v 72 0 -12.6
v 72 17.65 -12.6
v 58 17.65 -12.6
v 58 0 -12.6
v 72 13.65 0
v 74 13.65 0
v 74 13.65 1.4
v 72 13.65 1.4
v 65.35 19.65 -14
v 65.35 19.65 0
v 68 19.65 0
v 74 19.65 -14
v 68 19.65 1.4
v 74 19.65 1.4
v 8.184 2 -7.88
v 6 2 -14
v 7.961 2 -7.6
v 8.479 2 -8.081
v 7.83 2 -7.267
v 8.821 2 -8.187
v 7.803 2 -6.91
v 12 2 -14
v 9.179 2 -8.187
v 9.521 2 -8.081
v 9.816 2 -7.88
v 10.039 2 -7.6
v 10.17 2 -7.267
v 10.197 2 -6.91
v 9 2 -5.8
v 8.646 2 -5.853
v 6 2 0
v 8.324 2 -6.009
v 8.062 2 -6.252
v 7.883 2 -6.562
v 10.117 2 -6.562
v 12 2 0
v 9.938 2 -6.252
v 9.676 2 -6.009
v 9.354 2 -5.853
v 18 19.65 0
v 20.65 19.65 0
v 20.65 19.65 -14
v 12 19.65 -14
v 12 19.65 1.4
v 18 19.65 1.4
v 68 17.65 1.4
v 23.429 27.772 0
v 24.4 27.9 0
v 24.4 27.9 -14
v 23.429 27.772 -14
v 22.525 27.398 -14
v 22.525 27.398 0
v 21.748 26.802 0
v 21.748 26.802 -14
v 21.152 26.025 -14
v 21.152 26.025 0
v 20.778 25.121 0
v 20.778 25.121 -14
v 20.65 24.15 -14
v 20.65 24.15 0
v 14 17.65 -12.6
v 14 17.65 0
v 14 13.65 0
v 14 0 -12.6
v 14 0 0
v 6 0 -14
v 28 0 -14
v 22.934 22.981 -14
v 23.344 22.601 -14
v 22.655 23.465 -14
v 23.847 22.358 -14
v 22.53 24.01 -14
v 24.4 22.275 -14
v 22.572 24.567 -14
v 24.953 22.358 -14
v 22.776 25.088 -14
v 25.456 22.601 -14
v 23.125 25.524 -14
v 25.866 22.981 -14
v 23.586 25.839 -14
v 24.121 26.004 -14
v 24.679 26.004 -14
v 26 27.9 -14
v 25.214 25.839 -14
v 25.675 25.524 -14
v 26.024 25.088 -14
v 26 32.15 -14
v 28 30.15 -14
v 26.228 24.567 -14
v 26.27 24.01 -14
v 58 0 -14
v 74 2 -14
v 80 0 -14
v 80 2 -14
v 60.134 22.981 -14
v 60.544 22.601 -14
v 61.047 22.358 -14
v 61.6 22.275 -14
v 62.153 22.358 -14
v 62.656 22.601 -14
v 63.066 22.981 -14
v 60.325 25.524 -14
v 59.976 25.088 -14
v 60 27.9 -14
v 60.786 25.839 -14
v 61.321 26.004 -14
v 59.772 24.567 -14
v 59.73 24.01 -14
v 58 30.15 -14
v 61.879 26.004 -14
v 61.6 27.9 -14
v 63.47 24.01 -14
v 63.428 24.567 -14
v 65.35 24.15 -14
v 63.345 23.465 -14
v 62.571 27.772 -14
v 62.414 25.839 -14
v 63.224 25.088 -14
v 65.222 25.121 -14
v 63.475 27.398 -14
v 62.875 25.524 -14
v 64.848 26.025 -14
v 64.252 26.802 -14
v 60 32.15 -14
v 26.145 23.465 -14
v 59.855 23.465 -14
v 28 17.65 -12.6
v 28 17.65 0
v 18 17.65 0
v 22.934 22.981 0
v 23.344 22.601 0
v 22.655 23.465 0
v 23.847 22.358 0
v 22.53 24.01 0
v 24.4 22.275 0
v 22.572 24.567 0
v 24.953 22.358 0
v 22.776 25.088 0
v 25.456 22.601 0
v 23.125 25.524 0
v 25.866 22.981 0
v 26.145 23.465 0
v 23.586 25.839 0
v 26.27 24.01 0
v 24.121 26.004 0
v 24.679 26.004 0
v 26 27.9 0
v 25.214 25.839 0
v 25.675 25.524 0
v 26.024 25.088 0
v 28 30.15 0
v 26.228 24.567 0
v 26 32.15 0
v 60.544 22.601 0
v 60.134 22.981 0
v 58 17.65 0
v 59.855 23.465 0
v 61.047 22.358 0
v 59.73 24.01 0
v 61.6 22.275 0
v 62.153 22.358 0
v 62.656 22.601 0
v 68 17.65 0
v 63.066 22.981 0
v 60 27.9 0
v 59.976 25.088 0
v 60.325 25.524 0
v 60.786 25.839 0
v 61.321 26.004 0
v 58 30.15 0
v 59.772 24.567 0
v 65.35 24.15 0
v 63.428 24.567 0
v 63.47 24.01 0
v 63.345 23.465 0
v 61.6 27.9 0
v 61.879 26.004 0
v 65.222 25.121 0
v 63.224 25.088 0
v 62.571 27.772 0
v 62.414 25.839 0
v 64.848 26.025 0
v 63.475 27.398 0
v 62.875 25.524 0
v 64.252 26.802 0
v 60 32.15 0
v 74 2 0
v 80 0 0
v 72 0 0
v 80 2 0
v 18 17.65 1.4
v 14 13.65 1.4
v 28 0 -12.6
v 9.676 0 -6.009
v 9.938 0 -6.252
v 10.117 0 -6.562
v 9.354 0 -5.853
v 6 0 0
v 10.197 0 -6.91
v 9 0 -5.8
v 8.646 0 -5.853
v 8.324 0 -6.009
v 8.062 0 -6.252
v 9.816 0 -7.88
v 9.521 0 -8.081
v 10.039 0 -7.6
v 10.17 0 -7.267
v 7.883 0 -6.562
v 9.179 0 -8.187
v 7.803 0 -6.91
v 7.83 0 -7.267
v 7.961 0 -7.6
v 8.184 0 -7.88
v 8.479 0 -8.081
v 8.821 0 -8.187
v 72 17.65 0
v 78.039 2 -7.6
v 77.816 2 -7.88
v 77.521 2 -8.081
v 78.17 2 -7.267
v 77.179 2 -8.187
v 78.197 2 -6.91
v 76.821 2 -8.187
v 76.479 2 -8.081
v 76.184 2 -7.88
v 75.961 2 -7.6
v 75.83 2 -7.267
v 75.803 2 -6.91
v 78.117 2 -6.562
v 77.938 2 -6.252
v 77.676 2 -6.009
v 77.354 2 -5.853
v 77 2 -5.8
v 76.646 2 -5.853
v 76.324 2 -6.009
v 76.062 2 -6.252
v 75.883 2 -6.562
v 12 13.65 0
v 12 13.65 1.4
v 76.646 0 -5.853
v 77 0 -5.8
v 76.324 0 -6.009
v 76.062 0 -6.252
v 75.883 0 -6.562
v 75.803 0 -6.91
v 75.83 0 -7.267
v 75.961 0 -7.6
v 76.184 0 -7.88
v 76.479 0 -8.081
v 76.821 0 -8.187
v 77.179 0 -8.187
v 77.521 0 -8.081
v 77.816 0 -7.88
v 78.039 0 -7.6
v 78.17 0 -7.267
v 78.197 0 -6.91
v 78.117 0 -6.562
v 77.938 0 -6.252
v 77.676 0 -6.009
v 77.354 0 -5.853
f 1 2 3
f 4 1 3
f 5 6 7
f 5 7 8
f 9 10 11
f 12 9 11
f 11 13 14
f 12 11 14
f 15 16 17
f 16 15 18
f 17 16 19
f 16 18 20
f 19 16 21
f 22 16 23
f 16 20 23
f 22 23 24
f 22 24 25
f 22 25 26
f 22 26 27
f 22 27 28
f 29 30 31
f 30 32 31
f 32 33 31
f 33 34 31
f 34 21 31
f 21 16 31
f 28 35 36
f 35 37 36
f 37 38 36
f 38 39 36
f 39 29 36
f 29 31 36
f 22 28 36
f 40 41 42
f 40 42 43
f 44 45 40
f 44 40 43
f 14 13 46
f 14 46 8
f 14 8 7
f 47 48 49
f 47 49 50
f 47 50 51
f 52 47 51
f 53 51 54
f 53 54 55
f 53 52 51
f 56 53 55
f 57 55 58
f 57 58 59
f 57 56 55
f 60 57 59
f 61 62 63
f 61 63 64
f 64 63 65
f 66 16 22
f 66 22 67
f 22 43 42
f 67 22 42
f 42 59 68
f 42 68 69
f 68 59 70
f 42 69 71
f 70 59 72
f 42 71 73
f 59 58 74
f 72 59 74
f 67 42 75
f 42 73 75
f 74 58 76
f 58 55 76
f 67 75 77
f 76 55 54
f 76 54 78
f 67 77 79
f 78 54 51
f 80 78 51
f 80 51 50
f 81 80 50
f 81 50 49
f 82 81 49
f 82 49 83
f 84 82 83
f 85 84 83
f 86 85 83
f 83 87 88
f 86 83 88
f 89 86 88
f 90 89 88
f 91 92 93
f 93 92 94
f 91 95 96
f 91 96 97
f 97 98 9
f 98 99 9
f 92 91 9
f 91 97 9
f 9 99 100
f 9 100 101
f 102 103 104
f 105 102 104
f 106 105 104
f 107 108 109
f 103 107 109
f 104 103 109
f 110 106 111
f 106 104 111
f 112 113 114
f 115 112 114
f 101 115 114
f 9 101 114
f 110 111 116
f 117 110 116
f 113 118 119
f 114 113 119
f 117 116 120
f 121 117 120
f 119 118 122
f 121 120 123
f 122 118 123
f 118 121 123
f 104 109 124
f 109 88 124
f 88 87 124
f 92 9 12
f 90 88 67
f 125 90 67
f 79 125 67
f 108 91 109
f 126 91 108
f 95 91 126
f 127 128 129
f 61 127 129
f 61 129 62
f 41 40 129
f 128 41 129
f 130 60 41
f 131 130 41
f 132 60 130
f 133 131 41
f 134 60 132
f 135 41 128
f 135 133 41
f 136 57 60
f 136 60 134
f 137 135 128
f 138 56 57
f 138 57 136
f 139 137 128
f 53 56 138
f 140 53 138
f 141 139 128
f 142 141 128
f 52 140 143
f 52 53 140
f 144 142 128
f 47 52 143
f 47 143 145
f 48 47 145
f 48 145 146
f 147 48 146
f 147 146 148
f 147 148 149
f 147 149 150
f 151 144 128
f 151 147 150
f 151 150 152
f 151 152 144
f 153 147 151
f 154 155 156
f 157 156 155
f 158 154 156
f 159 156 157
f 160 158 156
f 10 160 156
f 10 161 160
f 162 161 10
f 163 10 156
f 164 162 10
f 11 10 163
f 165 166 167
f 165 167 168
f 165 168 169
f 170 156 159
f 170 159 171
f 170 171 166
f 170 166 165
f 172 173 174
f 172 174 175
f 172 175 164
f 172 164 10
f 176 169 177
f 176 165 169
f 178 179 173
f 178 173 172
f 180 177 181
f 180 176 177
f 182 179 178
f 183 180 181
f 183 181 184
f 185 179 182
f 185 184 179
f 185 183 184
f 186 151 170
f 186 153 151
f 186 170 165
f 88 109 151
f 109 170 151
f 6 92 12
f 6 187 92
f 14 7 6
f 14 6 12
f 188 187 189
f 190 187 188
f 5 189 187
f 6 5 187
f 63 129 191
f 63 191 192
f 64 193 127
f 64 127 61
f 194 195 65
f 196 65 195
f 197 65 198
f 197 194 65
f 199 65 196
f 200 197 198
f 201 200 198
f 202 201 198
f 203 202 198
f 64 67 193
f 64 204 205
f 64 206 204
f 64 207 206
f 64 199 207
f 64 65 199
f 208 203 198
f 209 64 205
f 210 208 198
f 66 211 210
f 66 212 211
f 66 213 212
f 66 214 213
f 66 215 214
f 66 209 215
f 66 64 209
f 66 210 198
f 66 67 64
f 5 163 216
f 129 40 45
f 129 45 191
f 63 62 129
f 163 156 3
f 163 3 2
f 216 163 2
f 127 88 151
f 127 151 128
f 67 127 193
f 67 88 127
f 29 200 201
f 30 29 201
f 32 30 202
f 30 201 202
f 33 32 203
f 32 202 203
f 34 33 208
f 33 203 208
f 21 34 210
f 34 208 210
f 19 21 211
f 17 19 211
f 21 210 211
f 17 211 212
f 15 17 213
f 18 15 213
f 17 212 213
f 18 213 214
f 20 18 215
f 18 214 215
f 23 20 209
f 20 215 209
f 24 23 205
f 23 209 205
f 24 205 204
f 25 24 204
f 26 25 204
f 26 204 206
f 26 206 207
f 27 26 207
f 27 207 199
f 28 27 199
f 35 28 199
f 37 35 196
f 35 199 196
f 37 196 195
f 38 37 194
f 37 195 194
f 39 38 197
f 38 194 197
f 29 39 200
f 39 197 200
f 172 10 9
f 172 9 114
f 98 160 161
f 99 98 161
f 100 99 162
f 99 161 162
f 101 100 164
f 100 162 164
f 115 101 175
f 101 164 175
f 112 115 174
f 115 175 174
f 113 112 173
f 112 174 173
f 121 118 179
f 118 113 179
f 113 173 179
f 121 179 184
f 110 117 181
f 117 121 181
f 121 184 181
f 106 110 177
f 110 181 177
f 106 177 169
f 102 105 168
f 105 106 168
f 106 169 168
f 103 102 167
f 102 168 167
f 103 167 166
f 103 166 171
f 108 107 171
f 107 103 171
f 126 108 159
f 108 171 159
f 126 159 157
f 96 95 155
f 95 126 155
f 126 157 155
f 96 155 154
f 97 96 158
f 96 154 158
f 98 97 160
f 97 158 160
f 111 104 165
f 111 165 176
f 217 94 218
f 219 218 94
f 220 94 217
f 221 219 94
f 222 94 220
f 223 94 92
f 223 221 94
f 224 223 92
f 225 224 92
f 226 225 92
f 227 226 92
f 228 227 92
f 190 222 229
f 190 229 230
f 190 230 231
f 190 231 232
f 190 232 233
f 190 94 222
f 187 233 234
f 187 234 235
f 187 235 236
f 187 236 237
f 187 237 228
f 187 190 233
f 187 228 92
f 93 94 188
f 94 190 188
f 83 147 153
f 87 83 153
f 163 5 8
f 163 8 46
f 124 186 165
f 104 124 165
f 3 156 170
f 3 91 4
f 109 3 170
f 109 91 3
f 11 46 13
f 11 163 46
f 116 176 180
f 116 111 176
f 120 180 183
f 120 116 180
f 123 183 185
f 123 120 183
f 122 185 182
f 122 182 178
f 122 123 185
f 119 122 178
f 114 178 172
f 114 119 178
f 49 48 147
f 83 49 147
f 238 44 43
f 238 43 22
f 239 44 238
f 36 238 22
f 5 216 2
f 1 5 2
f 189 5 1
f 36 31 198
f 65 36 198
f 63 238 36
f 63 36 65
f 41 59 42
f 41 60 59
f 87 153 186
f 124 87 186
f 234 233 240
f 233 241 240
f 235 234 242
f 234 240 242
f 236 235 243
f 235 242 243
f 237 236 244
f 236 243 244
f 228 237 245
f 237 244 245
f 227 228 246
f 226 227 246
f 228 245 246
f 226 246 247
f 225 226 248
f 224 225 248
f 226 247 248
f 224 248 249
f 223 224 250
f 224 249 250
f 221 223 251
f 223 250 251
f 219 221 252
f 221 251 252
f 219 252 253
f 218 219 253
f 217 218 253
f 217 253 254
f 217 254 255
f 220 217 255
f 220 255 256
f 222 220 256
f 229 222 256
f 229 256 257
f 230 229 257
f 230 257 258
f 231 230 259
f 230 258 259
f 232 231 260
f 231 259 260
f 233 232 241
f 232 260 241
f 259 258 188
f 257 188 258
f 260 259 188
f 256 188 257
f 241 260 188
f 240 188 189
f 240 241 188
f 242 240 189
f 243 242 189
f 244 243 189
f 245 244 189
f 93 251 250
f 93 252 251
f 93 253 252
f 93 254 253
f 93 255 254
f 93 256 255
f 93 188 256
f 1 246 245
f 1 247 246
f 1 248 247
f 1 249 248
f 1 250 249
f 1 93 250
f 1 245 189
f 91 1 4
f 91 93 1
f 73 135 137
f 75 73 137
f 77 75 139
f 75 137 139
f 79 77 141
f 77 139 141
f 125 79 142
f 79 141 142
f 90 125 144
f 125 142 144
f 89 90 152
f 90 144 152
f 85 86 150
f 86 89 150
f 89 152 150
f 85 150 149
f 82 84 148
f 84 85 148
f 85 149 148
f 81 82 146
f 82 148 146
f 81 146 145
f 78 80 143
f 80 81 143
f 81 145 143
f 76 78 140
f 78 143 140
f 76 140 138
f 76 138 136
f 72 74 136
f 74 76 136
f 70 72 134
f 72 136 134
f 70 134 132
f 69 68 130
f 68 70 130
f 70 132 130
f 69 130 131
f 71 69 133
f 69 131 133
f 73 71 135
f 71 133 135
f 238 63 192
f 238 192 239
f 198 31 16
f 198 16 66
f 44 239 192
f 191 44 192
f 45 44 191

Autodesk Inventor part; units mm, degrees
ref_plane "YZ Plane" through (0, 0, 0) normal (1, 0, 0) x (0, 1, 0)
ref_plane "XZ Plane" through (0, 0, 0) normal (0, 1, 0) x (-1, 0, 0)
ref_plane "XY Plane" through (0, 0, 0) normal (0, 0, 1) x (1, 0, 0)
sketch "スケッチ1" plane through (0, 0, 0) normal (0, 0, 1) x (1, 0, 0)
  line L0 (0, 0) -> (0, 17.65)
  line L1 (0, 17.65) -> (28, 17.65)
  line L2 (28, 17.65) -> (28, 30.15)
  line L3 (28, 30.15) -> (58, 30.15)
  line L4 (58, 30.15) -> (58, 0)
  line L5 (58, 0) -> (60, 0)
  line L6 (60, 0) -> (60, 32.15)
  line L7 (60, 32.15) -> (28, 32.15)
  line L8 (28, 32.15) -> (26, 32.15)
  line L9 (26, 32.15) -> (26, 19.65)
  line L10 (26, 19.65) -> (-2, 19.65)
  line L11 (-2, 19.65) -> (-2, 0)
  line L12 (-2, 0) -> (0, 0)
  dimension "d0" = 17.65
  dimension "d1" = 28
  dimension "d2" = 12.5
  dimension "d3" = 30
  dimension "d4" = 2
  dimension "d5" = 32.15
  dimension "d6" = 32
  dimension "d7" = 2
  dimension "d8" = 12.5
  dimension "d9" = 28
extrude "押し出し1" add sketch "スケッチ1" along normal blind 14
sketch "スケッチ2" plane through (60, 0, 0) normal (1, 0, 0) x (0, 0, -1)
  line L0 (0, 0) -> (-14, 0) projected
  line L1 (-14, 0) -> (0, 0)
  line L2 (0, 0) -> (0, 2)
  line L3 (0, 2) -> (-14, 2)
  line L4 (-14, 2) -> (-14, 0)
  dimension "d12" = 14
  dimension "d13" = 2
extrude "押し出し2" add sketch "スケッチ2" along normal blind 7
sketch "スケッチ3" plane through (-2, 0, 0) normal (-1, 0, 0) x (0, 0, 1)
  line L0 (14, 2) -> (0, 2) projected
  line L1 (0, 0) -> (14, 0)
  line L2 (14, 0) -> (14, 2)
  line L3 (14, 2) -> (0, 2)
  line L4 (0, 2) -> (0, 0)
  dimension "d16" = 14
extrude "押し出し3" add sketch "スケッチ3" along normal blind 7
sketch "スケッチ4" plane through (0, 0, 14) normal (0, 0, 1) x (1, 0, 0)
  line L0 (60, 32.15) -> (60, 24.15)
  line L1 (60, 24.15) -> (61.6, 24.15)
  arc A0 (61.6, 20.4) -> (61.6, 27.9) centre (61.6, 24.15) ccw
  line L2 (61.6, 24.15) -> (61.6, 20.4) construction
  line L3 (61.6, 24.15) -> (61.6, 27.9) construction
  line L4 (61.6, 27.9) -> (60, 27.9)
  line L5 (61.6, 20.4) -> (60, 20.4)
  line L6 (60, 2) -> (60, 32.15) projected
  line L7 (60, 27.9) -> (60, 20.4)
  point P0 (0, 0)
  dimension "d47" = 8
  dimension "d48" = 1.6
  dimension "d49" = 3.75
  dimension "d50" = 180
extrude "押し出し4" add sketch "スケッチ4" against normal blind 14
hole "穴3" at (61.6, 24.15, 14) direction (0, 0, -1) diameter 3.75 end through all
sketch "スケッチ7" plane through (0, 0, 14) normal (0, 0, 1) x (1, 0, 0)
  line L0 (60, 32.15) -> (26, 32.15) projected
  line L1 (26, 32.15) -> (26, 24.15)
  line L2 (26, 24.15) -> (24.4, 24.15)
  arc A0 (24.4, 27.9) -> (24.4, 20.4) centre (24.4, 24.15) ccw
  line L3 (24.4, 27.9) -> (26, 27.9)
  line L4 (24.4, 20.4) -> (26, 20.4)
  line L5 (26, 20.4) -> (26, 27.9)
  line L6 (26, 32.15) -> (26, 19.65) projected
  circle A1 centre (24.4, 24.15) radius 1.875
  point P0 (0, 0)
  dimension "d60" = 8
  dimension "d61" = 1.6
  dimension "d62" = 3.75
  dimension "d63" = 3.75
extrude "押し出し6" add sketch "スケッチ7" against normal blind 14 contours L1 A1 L5 L4 A0 L3 | L1 L5 A1 picked at (23.6929, 24.15)
hole "穴4" at (24.4, 24.15, 14) direction (0, 0, -1) diameter 3.75 end through all
sketch "スケッチ10" plane through (0, 17.65, 0) normal (0, -1, 0) x (1, 0, 0)
  line L0 (28, 14) -> (58, 14) projected
  line L1 (0, 0) -> (28, 0)
  line L2 (28, 0) -> (28, 14)
  line L3 (28, 14) -> (0, 14)
  line L4 (0, 14) -> (0, 0)
extrude "押し出し7" cut sketch "スケッチ10" against normal blind 0.6
sketch "スケッチ11" plane through (0, 0, 0) normal (0, -1, 0) x (1, 0, 0)
  line L0 (0, 14) -> (-9, 14) projected
  line L1 (60, 0) -> (67, 0) projected
  line L2 (-9, 14) -> (67, 14)
  line L3 (67, 14) -> (67, 0)
  line L4 (67, 0) -> (-9, 0)
  line L5 (-9, 0) -> (-9, 14)
  point P0 (0, 0)
extrude "押し出し8" cut sketch "スケッチ11" against normal blind 0.6
sketch "スケッチ12" plane through (0, 0, 14) normal (0, 0, 1) x (1, 0, 0)
  line L0 (-2, 19.65) -> (-2, 2) projected
  line L1 (-2, 19.65) -> (4, 19.65)
  line L2 (26, 19.65) -> (-2, 19.65) projected
  line L3 (4, 19.65) -> (4, 18.25)
  line L4 (0, 18.25) -> (28, 18.25) projected
  line L5 (4, 18.25) -> (0.2844, 14.5344)
  line L6 (4, 18.25) -> (9.2547, 18.25) construction
  line L7 (0.2844, 14.5344) -> (0, 14.25)
  line L8 (0, 0.6) -> (0, 18.25) projected
  line L9 (0, 14.25) -> (-2, 14.25)
  line L10 (-2, 14.25) -> (-2, 19.65)
  point P0 (0, 0)
  dimension "d79" = 6
  dimension "d80" = 135
extrude "押し出し9" add sketch "スケッチ12" along normal blind 2
sketch "スケッチ15" plane through (0, 0, 0) normal (0, 0, -1) x (-1, 0, 0)
  line L0 (0, 0.6) -> (0, 18.25) projected
  line L1 (0, 18.25) -> (-14, 18.25)
  line L2 (-14, 18.25) -> (-14, 0.6)
  line L3 (-14, 0.6) -> (0, 0.6)
  line L4 (0, 0.6) -> (0, 18.25)
  point P0 (0, 0)
  dimension "d88" = 14
extrude "押し出し11" add sketch "スケッチ15" against normal blind 1.4
sketch "スケッチ17" plane through (67, 0, 0) normal (1, 0, 0) x (0, 0, -1)
  line L0 (0, 0.6) -> (-14, 0.6) projected
  line L1 (0, 0.6) -> (-14, 0.6)
  line L2 (-14, 0.6) -> (-14, 9.5309)
  line L3 (-14, 9.5309) -> (0, 9.5309)
  line L4 (0, 9.5309) -> (0, 0.6)
  point P0 (0, 0)
extrude "押し出し13" cut sketch "スケッチ17" against normal blind 3
sketch "スケッチ18" plane through (-9, 0, 0) normal (-1, 0, 0) x (0, 0, 1)
  line L0 (0, 0.6) -> (14, 0.6) projected
  line L1 (0, 0.6) -> (14, 0.6)
  line L2 (14, 0.6) -> (14, 6.5)
  line L3 (14, 6.5) -> (0, 6.5)
  line L4 (0, 6.5) -> (0, 0.6)
  point P0 (0, 0)
extrude "押し出し14" cut sketch "スケッチ18" against normal blind 3
hole "穴5" at (-4, 2, 7) direction (0, -1, 0) diameter 2.4 end through all
hole "穴6" at (62, 2, 7) direction (0, -1, 0) diameter 2.4 end through all
mirror "ミラー1" about plane through (31.8158, 20.0509, 0) normal (0, 0, -1) of "押し出し3", "押し出し1", "押し出し4", "穴3", "押し出し2", "穴6", "穴4", "押し出し6", "押し出し7", "押し出し9", "押し出し11", "押し出し14", "押し出し13", "穴5", "押し出し8"
sketch "スケッチ19" plane through (0, 0, 14) normal (0, 0, 1) x (1, 0, 0)
  line L0 (94.8832, 81.412) -> (-62.365, 81.412)
  line L1 (-62.365, 81.412) -> (-62.365, -71.7744)
  line L2 (-62.365, -71.7744) -> (94.8832, -71.7744)
  line L3 (94.8832, -71.7744) -> (94.8832, 81.412)
  point P0 (0, 0)
extrude "押し出し15" cut sketch "スケッチ19" against normal blind 14
sketch "スケッチ20" plane through (-2, 19.65, 14) normal (0, 1, 0) x (1, 0, 0)
  line L0 (17.6833, -4.2941) -> (-12.6138, -4.2941)
  line L1 (-12.6138, -4.2941) -> (-12.6138, 1.0873)
  line L2 (-12.6138, 1.0873) -> (17.6833, 1.0873)
  line L3 (17.6833, 1.0873) -> (17.6833, -4.2941)
  point P0 (2, 14)
extrude "押し出し16" cut sketch "スケッチ20" against normal blind 14
sketch "スケッチ21" plane through (26, 27.9, -14) normal (-1, 0, 0) x (0, 0, 1)
  line L0 (0, -8.25) -> (-2, -8.25) projected
  line L1 (-2, -8.25) -> (18.9234, -8.25)
  line L2 (18.9234, -8.25) -> (18.9234, 5.2405)
  line L3 (18.9234, 5.2405) -> (-2, 5.2405)
  line L4 (-2, 5.2405) -> (-2, -8.25)
  point P0 (14, -27.9)
split body "分割1" sketch "スケッチ21" result one side removed curves L2 L3 L4 L1 removed pieces at (9.3333, 19.15, -4.6667) (58.5, 13.3, -4.6667)
sketch "スケッチ22" plane through (0, 0, 0) normal (0, 0, 1) x (1, 0, 0)
  line L0 (28, 19.65) -> (28, 30.15) projected
  line L1 (28, 19.65) -> (28, 17.65)
  line L2 (28, 17.65) -> (14, 17.65)
  line L3 (14, 17.65) -> (14, 0)
  line L4 (14, 17.65) -> (31.65, 17.65) construction
  line L5 (14, 0) -> (8, 0)
  line L6 (8, 0) -> (8, 2)
  line L7 (8, 2) -> (12, 2)
  line L8 (26.0798, 19.65) -> (12, 19.65)
  line L9 (12, 19.65) -> (12, 2)
  line L10 (58, 19.65) -> (60, 19.65) projected
  line L11 (58, 19.65) -> (58, 17.65)
  line L12 (58, 17.65) -> (72, 17.65)
  line L13 (72, 17.65) -> (72, 0)
  line L14 (72, 0) -> (78, 0)
  line L15 (78, 0) -> (78, 2)
  line L16 (78, 2) -> (74, 2)
  line L17 (74, 2) -> (74, 19.65)
  line L18 (74, 19.65) -> (60, 19.65)
  line L19 (26.0798, 19.65) -> (28, 19.65)
  line L20 (24.4, 20.4) -> (26, 20.4) projected
  line L21 (58, 19.65) -> (60, 19.65)
  point P0 (0, 0)
  dimension "d119" = 2
  dimension "d120" = 14
  dimension "d121" = 17.65
  dimension "d122" = 90
  dimension "d123" = 6
  dimension "d124" = 2
  dimension "d125" = 4
  dimension "d126" = 14
  dimension "d127" = 6
  dimension "d128" = 2
  dimension "d129" = 4
extrude "押し出し17" add sketch "スケッチ22" against normal blind 14
sketch "スケッチ23" plane through (26, 32.15, -14) normal (0, 1, 0) x (1, 0, 0)
  line L0 (32, -14) -> (2, -14) projected
  line L1 (17, -14) -> (17, 0)
  line L2 (2, 0) -> (32, 0) projected
  point P0 (-26, -14)
sketch "スケッチ25" plane through (24.4, 24.15, -14) normal (0, 0, -1) x (-1, 0, 0)
  line L0 (-3.6, -6.5) -> (10.4, -6.5) projected
  line L1 (10.4, -6.5) -> (-3.6, -6.5)
  line L2 (-3.6, -6.5) -> (-3.6, -24.15)
  line L3 (-3.6, -24.15) -> (10.4, -24.15)
  line L4 (10.4, -24.15) -> (10.4, -6.5)
  point P0 (24.4, -24.15)
extrude "押し出し18" add sketch "スケッチ25" against normal blind 1.4
ref_plane "作業平面1" through (43, 32.15, 0) normal (1, 0, 0) x (0, 0, -1)
mirror "ミラー3" about plane through (43, 32.15, 0) normal (1, 0, 0) of "押し出し18"
sketch "スケッチ26" plane through (0, 0, 0) normal (0, 0, 1) x (1, 0, 0)
  line L0 (12, 2) -> (12, 19.65) projected
  line L1 (12, 19.65) -> (18, 19.65)
  line L2 (12, 19.65) -> (26, 19.65) projected
  line L3 (18, 19.65) -> (18, 17.65)
  line L4 (28, 17.65) -> (14, 17.65) projected
  line L5 (18, 17.65) -> (14, 13.65)
  line L6 (14, 17.65) -> (14, 0) projected
  line L7 (18, 17.65) -> (23.6569, 17.65) construction
  line L8 (14, 13.65) -> (12, 13.65)
  line L9 (12, 13.65) -> (12, 19.65)
  point P0 (0, 0)
  dimension "d139" = 6
  dimension "d140" = 135
extrude "押し出し20" add sketch "スケッチ26" along normal blind 1.4
mirror "ミラー4" about plane through (43, 32.15, 0) normal (1, 0, 0) of "押し出し20"
sketch "スケッチ27" plane through (0, 0, 0) normal (0, 0, 1) x (1, 0, 0)
  line L0 (8, 2) -> (12, 2) projected
  line L1 (8, 2) -> (6, 2)
  line L2 (6, 2) -> (6, 0)
  line L3 (6, 0) -> (8, 0)
  line L4 (8, 0) -> (8, 2)
  line L5 (78, 2) -> (80, 2)
  line L6 (80, 2) -> (80, 0)
  line L7 (80, 0) -> (78, 0)
  line L8 (78, 0) -> (78, 2)
  point P0 (0, 0)
  dimension "d143" = 2
  dimension "d144" = 2
extrude "押し出し21" add sketch "スケッチ27" against normal blind 14
hole "穴7" at (77, 2, -7) direction (0, -1, 0) diameter 2.4 end through all
hole "穴8" at (9, 2, -7) direction (0, -1, 0) diameter 2.4 end through all
sketch "スケッチ28" plane through (0, 0, 0) normal (0, 0, 1) x (1, 0, 0)
  arc A0 (24.4, 27.9) -> (24.4, 20.4) centre (24.4, 24.15) ccw projected
  line L0 (20.65, 24.15) -> (20.65, 19.65)
  line L1 (12, 19.65) -> (26, 19.65) projected
  line L2 (24.4, 20.4) -> (26, 20.4) projected
  line L3 (26, 19.65) -> (26, 20.4)
  line L4 (26, 20.4) -> (20.65, 24.15)
  point P0 (0, 0)
extrude "押し出し22" add sketch "スケッチ28" against normal blind 14 contours A0 L2 L3 L1 L0
mirror "ミラー5" about plane through (43, 32.15, 0) normal (1, 0, 0) of "押し出し22"
properties part number "センサ冶具1セット"
